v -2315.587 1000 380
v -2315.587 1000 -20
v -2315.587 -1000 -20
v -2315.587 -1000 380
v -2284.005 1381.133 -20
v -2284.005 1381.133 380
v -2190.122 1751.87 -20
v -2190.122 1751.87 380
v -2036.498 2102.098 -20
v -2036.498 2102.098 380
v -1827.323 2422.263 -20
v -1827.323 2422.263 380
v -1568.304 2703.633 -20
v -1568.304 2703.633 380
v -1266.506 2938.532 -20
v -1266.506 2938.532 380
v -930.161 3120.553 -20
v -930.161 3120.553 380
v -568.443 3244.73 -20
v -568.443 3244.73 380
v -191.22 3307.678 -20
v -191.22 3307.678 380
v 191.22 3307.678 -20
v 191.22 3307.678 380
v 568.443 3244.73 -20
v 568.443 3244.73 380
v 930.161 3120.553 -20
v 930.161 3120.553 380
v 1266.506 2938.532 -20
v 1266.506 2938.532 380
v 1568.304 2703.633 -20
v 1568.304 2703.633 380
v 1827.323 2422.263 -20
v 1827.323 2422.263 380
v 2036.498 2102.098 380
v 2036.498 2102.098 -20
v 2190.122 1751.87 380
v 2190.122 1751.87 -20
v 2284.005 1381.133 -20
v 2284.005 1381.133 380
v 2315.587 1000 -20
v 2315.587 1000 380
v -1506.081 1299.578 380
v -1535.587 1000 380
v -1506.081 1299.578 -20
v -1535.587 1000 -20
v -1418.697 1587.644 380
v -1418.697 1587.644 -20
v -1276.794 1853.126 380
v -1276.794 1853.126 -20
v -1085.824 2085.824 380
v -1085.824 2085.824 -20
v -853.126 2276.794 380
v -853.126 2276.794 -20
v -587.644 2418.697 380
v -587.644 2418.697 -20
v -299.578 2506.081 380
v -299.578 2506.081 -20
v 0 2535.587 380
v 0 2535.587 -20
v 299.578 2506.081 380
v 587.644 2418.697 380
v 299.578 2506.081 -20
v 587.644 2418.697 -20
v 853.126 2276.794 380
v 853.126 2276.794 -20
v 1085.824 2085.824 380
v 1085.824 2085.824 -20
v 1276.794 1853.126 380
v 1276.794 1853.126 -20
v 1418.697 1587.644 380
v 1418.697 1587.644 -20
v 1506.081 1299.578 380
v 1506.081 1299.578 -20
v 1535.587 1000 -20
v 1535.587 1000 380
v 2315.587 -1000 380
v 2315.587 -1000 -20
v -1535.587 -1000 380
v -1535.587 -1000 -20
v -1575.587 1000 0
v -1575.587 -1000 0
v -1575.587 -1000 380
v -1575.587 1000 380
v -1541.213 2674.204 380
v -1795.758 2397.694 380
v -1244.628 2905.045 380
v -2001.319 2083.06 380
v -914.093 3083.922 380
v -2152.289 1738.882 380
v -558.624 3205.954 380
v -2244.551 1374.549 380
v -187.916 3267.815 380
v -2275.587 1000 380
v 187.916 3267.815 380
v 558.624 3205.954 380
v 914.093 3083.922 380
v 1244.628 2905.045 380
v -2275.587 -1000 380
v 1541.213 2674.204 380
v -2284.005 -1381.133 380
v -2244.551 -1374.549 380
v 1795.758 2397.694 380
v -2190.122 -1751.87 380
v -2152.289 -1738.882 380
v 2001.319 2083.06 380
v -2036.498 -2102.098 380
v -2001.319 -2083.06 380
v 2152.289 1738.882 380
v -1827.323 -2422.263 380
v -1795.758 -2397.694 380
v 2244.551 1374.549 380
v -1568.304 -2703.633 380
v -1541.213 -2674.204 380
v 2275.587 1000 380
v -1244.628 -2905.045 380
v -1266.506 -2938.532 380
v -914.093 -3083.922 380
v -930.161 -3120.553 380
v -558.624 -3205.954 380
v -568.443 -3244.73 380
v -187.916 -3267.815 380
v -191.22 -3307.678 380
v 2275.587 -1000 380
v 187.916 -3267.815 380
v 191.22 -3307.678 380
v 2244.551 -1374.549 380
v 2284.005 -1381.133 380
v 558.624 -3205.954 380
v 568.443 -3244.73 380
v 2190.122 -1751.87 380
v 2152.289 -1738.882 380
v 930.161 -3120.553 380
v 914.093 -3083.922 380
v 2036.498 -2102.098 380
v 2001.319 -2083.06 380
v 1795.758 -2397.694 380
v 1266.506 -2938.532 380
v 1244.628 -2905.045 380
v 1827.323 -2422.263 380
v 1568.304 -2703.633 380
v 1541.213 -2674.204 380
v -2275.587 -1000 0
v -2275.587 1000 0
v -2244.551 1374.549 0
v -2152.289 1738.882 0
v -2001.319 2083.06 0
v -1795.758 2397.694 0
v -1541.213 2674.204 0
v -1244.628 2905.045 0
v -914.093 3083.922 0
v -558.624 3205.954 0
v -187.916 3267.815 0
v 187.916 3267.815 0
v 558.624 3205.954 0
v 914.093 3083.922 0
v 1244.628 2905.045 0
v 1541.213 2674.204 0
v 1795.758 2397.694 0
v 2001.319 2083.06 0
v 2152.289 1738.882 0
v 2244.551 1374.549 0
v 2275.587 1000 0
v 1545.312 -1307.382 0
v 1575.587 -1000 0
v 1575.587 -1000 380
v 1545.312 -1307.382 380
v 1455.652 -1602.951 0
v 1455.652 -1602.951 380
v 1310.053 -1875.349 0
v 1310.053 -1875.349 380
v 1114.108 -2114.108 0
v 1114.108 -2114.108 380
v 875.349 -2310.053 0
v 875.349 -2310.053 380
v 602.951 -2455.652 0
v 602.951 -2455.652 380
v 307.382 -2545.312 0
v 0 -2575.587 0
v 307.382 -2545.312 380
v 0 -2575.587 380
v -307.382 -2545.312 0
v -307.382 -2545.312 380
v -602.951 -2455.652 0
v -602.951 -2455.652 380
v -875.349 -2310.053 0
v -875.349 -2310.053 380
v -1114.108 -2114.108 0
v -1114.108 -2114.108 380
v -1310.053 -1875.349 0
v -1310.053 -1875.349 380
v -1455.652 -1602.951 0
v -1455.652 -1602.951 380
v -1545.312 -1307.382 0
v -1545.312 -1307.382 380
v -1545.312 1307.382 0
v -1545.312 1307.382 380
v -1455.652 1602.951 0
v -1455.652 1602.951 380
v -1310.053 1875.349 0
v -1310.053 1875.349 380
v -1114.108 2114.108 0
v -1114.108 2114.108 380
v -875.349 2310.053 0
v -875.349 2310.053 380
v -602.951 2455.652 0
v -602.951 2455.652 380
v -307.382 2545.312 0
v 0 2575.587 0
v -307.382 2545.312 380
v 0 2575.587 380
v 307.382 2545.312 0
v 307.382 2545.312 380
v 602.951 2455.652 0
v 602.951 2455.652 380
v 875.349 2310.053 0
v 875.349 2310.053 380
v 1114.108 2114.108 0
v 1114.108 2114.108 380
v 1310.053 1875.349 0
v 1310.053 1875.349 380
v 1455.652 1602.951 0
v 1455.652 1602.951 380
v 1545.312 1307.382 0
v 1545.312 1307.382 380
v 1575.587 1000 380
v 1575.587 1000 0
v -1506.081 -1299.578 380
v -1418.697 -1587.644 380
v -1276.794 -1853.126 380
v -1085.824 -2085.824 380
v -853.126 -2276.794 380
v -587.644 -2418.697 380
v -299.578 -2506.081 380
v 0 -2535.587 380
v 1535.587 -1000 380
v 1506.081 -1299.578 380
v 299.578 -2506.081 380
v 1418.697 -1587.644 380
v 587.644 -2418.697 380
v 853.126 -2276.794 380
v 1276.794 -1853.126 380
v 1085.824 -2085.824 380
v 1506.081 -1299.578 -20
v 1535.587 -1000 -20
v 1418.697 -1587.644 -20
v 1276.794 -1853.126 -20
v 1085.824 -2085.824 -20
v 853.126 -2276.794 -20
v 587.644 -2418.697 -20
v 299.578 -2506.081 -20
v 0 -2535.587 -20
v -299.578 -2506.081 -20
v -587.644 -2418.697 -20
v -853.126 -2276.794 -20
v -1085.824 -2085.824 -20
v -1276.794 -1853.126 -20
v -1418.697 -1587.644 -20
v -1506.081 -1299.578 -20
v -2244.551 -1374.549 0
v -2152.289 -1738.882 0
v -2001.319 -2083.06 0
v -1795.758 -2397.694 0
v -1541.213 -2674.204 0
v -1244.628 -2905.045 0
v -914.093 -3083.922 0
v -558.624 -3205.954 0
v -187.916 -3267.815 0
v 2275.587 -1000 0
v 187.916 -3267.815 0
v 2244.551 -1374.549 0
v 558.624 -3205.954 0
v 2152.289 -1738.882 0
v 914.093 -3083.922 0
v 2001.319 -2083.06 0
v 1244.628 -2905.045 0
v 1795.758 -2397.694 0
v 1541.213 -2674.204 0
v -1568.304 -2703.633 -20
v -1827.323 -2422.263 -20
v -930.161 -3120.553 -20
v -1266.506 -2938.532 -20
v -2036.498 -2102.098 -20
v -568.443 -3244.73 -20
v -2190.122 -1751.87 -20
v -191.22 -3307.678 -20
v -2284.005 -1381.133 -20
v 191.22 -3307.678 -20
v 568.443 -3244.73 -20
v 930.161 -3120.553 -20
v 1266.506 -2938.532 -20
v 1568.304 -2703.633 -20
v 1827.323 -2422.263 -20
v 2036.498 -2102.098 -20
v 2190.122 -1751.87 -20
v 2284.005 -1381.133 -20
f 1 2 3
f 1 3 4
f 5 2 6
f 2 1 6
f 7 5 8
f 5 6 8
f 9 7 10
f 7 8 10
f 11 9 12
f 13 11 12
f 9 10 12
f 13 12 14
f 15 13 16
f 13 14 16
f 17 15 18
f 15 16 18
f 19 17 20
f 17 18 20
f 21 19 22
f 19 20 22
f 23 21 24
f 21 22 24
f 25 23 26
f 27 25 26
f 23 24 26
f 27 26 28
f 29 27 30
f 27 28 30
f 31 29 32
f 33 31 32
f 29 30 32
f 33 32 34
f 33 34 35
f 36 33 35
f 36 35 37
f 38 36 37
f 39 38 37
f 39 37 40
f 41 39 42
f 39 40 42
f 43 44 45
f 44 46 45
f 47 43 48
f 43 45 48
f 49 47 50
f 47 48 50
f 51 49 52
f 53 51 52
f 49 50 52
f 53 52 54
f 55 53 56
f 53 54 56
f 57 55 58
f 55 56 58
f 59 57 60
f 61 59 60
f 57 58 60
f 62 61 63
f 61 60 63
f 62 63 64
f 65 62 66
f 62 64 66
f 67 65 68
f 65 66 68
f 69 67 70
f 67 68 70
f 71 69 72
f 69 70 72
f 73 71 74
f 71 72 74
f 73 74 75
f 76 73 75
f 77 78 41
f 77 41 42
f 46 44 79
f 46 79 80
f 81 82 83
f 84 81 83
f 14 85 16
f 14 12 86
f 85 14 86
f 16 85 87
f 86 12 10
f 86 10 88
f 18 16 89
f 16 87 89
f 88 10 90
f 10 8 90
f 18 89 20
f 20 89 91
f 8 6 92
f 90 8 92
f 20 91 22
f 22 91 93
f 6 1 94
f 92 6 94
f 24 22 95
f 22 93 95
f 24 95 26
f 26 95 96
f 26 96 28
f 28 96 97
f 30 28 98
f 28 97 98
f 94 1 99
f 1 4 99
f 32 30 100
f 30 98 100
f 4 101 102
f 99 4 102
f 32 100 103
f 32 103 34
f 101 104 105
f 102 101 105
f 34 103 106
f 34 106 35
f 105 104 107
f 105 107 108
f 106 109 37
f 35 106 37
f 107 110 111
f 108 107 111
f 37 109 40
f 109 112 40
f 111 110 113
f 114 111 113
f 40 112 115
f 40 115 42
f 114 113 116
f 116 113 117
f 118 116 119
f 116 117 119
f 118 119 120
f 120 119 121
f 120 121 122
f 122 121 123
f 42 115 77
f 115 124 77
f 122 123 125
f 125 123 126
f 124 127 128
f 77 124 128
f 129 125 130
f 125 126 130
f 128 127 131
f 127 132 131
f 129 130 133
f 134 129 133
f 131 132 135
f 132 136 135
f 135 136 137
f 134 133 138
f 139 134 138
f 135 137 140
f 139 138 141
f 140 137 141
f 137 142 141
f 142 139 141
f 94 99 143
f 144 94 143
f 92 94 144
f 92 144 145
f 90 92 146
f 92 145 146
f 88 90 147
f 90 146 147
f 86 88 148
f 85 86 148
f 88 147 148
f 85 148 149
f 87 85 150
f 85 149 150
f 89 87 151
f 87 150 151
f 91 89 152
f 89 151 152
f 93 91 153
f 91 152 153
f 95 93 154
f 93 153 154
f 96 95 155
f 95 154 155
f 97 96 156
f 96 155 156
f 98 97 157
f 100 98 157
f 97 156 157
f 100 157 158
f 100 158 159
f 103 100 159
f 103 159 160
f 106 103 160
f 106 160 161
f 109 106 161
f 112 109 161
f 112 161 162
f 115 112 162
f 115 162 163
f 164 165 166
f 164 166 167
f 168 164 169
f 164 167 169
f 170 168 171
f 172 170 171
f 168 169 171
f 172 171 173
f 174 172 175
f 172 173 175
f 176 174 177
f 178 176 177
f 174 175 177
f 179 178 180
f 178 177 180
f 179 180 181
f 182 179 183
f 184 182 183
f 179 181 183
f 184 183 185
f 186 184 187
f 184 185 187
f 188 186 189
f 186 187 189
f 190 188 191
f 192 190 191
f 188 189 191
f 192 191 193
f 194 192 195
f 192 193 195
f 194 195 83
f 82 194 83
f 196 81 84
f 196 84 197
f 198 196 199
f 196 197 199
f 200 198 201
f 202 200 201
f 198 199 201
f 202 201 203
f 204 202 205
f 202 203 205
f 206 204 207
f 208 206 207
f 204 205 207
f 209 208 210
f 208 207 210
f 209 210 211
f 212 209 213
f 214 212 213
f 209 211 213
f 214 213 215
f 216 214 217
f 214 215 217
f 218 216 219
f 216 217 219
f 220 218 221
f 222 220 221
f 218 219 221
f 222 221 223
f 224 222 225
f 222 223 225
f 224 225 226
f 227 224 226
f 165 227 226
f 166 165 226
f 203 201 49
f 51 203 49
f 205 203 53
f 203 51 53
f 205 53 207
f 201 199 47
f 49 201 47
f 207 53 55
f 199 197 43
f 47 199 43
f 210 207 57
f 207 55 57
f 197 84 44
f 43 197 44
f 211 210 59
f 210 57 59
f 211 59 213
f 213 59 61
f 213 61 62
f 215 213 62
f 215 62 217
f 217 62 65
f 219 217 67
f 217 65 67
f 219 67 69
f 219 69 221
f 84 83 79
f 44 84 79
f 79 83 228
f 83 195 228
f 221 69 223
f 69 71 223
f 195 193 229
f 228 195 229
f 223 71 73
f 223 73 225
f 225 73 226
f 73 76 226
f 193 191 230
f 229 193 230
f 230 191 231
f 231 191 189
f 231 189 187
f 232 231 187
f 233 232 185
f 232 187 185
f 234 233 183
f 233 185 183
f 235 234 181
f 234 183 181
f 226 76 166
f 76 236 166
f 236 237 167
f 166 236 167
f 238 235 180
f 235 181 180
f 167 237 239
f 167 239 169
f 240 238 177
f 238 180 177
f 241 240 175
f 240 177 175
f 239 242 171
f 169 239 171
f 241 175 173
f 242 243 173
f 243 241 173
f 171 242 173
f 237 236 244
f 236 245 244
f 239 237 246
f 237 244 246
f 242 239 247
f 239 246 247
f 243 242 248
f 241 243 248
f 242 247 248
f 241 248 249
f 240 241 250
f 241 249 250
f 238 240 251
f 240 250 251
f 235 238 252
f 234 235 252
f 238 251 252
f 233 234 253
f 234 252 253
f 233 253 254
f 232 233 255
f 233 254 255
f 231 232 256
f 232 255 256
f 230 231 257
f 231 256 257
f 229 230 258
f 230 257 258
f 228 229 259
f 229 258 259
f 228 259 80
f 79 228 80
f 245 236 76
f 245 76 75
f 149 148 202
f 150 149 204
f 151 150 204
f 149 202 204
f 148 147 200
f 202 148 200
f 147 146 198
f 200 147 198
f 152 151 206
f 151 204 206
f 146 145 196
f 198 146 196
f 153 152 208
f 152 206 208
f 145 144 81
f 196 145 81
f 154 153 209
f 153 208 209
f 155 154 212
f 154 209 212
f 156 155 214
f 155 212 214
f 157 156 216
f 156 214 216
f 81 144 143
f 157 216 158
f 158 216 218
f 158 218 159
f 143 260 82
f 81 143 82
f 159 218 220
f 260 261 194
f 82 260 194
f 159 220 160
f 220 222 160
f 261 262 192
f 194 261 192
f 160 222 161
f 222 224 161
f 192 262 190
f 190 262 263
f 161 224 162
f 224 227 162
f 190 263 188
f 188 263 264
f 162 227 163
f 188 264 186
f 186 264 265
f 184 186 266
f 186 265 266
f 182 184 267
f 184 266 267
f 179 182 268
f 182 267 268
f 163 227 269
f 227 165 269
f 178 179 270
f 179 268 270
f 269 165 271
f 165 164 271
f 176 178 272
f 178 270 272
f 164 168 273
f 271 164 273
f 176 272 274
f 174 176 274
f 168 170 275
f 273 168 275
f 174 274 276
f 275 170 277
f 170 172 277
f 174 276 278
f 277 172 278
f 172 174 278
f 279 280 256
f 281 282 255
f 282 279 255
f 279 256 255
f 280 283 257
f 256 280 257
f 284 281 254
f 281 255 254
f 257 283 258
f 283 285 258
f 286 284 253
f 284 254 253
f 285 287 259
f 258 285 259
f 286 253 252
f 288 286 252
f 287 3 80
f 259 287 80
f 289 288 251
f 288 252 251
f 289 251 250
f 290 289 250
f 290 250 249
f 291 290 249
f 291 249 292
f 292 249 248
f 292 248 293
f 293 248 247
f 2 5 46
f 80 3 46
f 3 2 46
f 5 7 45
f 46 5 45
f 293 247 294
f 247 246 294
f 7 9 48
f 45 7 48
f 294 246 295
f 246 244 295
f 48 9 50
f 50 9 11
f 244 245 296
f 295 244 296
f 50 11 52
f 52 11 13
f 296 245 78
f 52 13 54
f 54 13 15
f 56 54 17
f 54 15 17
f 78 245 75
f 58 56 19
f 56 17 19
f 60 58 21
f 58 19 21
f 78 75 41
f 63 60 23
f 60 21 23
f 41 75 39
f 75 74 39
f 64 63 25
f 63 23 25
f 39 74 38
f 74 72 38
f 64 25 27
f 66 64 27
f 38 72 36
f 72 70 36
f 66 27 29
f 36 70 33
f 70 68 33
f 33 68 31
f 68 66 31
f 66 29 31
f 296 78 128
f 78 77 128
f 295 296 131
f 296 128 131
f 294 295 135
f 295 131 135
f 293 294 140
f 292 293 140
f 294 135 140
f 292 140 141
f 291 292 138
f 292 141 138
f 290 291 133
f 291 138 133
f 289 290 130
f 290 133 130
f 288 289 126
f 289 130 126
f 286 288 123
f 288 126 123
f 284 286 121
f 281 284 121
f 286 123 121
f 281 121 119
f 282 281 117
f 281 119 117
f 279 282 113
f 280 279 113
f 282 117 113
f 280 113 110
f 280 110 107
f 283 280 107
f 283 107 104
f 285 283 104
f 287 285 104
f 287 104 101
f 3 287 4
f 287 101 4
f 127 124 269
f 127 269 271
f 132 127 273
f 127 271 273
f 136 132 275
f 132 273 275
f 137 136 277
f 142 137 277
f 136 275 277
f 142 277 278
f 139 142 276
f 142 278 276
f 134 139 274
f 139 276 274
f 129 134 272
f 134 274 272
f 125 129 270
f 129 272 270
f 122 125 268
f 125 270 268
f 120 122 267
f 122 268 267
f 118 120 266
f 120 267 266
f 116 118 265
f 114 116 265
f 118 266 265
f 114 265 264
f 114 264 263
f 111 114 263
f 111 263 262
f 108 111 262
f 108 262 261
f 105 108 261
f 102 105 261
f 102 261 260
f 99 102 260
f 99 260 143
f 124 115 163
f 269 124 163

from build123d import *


with BuildPart() as f2:
    # F2: sweep along a path in F0
    with BuildLine(Plane.XY) as f2_path:
        ThreePointArc((-2000, 1000), (0, 3000), (2000, 1000))
        Line((2000, 1000), (2000, 0))
        Line((2000, 0), (2000, -1000))
        ThreePointArc((2000, -1000), (0, -3000), (-2000, -1000))
        Line((-2000, -1000), (-2000, 0))
        Line((-2000, 0), (-2000, 1000))
    # F1 (on Front) → F2 (sweep)
    with BuildSketch(Plane.XZ):
        Polygon((1535.5868196487, -20), (1925.5868196487, -20), (2315.5868196487, -20), (2315.5868196487, 380), (2275.5868196487, 380), (2275.5868196487, 0), (1575.5868196487, 0), (1575.5868196487, 380), (1535.5868196487, 380), align=None)
    sweep(path=f2_path.line)


solid = f2.part
